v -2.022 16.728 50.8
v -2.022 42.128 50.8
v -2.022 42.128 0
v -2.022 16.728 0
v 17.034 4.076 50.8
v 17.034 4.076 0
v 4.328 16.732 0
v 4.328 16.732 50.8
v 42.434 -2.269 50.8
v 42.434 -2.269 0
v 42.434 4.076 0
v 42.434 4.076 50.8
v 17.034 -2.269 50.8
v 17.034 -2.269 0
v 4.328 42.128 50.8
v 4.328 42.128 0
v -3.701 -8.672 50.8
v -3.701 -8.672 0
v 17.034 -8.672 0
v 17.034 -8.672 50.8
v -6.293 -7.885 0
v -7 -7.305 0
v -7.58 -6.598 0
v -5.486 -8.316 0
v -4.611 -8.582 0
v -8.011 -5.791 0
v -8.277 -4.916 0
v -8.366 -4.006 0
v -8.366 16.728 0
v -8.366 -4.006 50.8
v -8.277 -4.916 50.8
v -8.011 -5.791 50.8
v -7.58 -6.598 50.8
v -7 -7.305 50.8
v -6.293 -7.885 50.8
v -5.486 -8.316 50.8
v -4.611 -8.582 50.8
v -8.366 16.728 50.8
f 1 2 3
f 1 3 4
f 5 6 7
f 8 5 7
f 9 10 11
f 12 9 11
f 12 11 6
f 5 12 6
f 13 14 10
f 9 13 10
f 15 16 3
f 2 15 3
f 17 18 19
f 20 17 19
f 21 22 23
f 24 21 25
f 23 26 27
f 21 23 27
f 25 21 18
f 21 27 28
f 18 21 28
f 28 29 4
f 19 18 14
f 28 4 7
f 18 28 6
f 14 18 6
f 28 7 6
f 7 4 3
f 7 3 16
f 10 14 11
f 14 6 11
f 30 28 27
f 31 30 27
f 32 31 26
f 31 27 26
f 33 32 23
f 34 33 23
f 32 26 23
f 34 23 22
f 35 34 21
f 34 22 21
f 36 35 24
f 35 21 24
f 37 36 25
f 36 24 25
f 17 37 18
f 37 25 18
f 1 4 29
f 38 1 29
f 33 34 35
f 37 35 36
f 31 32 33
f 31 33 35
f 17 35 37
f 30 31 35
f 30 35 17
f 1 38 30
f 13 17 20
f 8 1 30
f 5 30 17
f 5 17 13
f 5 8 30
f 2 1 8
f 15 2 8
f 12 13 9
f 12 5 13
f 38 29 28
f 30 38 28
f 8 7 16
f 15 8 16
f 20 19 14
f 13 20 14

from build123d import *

# Parameters (mm, degrees)
F1_DEPTH = 50.8


with BuildPart() as f1:
    # F0 (on Top) → F1 (new body)
    with BuildSketch(Plane.XY):
        with BuildLine():
            Line((4.327607, 16.73235), (4.327607, 42.128453))
            Line((4.327607, 42.128453), (-2.022393, 42.128453))
            Line((-2.022393, 42.128453), (-2.022393, 16.728453))
            Line((-2.022393, 16.728453), (-8.366409, 16.728453))
            Line((-8.366409, 16.728453), (-8.366409, -4.005756))
            ThreePointArc((-8.366409, -4.005756), (-6.999831, -7.304968), (-3.700619, -8.671547))
            Line((-3.700619, -8.671547), (17.033591, -8.671547))
            Line((17.033591, -8.671547), (17.033591, -2.26923))
            Line((17.033591, -2.26923), (42.433591, -2.26923))
            Line((42.433591, -2.26923), (42.433591, 4.076364))
            Line((42.433591, 4.076364), (17.033591, 4.076364))
            Line((17.033591, 4.076364), (4.327607, 16.73235))
        make_face()
    extrude(amount=F1_DEPTH)


solid = f1.part
